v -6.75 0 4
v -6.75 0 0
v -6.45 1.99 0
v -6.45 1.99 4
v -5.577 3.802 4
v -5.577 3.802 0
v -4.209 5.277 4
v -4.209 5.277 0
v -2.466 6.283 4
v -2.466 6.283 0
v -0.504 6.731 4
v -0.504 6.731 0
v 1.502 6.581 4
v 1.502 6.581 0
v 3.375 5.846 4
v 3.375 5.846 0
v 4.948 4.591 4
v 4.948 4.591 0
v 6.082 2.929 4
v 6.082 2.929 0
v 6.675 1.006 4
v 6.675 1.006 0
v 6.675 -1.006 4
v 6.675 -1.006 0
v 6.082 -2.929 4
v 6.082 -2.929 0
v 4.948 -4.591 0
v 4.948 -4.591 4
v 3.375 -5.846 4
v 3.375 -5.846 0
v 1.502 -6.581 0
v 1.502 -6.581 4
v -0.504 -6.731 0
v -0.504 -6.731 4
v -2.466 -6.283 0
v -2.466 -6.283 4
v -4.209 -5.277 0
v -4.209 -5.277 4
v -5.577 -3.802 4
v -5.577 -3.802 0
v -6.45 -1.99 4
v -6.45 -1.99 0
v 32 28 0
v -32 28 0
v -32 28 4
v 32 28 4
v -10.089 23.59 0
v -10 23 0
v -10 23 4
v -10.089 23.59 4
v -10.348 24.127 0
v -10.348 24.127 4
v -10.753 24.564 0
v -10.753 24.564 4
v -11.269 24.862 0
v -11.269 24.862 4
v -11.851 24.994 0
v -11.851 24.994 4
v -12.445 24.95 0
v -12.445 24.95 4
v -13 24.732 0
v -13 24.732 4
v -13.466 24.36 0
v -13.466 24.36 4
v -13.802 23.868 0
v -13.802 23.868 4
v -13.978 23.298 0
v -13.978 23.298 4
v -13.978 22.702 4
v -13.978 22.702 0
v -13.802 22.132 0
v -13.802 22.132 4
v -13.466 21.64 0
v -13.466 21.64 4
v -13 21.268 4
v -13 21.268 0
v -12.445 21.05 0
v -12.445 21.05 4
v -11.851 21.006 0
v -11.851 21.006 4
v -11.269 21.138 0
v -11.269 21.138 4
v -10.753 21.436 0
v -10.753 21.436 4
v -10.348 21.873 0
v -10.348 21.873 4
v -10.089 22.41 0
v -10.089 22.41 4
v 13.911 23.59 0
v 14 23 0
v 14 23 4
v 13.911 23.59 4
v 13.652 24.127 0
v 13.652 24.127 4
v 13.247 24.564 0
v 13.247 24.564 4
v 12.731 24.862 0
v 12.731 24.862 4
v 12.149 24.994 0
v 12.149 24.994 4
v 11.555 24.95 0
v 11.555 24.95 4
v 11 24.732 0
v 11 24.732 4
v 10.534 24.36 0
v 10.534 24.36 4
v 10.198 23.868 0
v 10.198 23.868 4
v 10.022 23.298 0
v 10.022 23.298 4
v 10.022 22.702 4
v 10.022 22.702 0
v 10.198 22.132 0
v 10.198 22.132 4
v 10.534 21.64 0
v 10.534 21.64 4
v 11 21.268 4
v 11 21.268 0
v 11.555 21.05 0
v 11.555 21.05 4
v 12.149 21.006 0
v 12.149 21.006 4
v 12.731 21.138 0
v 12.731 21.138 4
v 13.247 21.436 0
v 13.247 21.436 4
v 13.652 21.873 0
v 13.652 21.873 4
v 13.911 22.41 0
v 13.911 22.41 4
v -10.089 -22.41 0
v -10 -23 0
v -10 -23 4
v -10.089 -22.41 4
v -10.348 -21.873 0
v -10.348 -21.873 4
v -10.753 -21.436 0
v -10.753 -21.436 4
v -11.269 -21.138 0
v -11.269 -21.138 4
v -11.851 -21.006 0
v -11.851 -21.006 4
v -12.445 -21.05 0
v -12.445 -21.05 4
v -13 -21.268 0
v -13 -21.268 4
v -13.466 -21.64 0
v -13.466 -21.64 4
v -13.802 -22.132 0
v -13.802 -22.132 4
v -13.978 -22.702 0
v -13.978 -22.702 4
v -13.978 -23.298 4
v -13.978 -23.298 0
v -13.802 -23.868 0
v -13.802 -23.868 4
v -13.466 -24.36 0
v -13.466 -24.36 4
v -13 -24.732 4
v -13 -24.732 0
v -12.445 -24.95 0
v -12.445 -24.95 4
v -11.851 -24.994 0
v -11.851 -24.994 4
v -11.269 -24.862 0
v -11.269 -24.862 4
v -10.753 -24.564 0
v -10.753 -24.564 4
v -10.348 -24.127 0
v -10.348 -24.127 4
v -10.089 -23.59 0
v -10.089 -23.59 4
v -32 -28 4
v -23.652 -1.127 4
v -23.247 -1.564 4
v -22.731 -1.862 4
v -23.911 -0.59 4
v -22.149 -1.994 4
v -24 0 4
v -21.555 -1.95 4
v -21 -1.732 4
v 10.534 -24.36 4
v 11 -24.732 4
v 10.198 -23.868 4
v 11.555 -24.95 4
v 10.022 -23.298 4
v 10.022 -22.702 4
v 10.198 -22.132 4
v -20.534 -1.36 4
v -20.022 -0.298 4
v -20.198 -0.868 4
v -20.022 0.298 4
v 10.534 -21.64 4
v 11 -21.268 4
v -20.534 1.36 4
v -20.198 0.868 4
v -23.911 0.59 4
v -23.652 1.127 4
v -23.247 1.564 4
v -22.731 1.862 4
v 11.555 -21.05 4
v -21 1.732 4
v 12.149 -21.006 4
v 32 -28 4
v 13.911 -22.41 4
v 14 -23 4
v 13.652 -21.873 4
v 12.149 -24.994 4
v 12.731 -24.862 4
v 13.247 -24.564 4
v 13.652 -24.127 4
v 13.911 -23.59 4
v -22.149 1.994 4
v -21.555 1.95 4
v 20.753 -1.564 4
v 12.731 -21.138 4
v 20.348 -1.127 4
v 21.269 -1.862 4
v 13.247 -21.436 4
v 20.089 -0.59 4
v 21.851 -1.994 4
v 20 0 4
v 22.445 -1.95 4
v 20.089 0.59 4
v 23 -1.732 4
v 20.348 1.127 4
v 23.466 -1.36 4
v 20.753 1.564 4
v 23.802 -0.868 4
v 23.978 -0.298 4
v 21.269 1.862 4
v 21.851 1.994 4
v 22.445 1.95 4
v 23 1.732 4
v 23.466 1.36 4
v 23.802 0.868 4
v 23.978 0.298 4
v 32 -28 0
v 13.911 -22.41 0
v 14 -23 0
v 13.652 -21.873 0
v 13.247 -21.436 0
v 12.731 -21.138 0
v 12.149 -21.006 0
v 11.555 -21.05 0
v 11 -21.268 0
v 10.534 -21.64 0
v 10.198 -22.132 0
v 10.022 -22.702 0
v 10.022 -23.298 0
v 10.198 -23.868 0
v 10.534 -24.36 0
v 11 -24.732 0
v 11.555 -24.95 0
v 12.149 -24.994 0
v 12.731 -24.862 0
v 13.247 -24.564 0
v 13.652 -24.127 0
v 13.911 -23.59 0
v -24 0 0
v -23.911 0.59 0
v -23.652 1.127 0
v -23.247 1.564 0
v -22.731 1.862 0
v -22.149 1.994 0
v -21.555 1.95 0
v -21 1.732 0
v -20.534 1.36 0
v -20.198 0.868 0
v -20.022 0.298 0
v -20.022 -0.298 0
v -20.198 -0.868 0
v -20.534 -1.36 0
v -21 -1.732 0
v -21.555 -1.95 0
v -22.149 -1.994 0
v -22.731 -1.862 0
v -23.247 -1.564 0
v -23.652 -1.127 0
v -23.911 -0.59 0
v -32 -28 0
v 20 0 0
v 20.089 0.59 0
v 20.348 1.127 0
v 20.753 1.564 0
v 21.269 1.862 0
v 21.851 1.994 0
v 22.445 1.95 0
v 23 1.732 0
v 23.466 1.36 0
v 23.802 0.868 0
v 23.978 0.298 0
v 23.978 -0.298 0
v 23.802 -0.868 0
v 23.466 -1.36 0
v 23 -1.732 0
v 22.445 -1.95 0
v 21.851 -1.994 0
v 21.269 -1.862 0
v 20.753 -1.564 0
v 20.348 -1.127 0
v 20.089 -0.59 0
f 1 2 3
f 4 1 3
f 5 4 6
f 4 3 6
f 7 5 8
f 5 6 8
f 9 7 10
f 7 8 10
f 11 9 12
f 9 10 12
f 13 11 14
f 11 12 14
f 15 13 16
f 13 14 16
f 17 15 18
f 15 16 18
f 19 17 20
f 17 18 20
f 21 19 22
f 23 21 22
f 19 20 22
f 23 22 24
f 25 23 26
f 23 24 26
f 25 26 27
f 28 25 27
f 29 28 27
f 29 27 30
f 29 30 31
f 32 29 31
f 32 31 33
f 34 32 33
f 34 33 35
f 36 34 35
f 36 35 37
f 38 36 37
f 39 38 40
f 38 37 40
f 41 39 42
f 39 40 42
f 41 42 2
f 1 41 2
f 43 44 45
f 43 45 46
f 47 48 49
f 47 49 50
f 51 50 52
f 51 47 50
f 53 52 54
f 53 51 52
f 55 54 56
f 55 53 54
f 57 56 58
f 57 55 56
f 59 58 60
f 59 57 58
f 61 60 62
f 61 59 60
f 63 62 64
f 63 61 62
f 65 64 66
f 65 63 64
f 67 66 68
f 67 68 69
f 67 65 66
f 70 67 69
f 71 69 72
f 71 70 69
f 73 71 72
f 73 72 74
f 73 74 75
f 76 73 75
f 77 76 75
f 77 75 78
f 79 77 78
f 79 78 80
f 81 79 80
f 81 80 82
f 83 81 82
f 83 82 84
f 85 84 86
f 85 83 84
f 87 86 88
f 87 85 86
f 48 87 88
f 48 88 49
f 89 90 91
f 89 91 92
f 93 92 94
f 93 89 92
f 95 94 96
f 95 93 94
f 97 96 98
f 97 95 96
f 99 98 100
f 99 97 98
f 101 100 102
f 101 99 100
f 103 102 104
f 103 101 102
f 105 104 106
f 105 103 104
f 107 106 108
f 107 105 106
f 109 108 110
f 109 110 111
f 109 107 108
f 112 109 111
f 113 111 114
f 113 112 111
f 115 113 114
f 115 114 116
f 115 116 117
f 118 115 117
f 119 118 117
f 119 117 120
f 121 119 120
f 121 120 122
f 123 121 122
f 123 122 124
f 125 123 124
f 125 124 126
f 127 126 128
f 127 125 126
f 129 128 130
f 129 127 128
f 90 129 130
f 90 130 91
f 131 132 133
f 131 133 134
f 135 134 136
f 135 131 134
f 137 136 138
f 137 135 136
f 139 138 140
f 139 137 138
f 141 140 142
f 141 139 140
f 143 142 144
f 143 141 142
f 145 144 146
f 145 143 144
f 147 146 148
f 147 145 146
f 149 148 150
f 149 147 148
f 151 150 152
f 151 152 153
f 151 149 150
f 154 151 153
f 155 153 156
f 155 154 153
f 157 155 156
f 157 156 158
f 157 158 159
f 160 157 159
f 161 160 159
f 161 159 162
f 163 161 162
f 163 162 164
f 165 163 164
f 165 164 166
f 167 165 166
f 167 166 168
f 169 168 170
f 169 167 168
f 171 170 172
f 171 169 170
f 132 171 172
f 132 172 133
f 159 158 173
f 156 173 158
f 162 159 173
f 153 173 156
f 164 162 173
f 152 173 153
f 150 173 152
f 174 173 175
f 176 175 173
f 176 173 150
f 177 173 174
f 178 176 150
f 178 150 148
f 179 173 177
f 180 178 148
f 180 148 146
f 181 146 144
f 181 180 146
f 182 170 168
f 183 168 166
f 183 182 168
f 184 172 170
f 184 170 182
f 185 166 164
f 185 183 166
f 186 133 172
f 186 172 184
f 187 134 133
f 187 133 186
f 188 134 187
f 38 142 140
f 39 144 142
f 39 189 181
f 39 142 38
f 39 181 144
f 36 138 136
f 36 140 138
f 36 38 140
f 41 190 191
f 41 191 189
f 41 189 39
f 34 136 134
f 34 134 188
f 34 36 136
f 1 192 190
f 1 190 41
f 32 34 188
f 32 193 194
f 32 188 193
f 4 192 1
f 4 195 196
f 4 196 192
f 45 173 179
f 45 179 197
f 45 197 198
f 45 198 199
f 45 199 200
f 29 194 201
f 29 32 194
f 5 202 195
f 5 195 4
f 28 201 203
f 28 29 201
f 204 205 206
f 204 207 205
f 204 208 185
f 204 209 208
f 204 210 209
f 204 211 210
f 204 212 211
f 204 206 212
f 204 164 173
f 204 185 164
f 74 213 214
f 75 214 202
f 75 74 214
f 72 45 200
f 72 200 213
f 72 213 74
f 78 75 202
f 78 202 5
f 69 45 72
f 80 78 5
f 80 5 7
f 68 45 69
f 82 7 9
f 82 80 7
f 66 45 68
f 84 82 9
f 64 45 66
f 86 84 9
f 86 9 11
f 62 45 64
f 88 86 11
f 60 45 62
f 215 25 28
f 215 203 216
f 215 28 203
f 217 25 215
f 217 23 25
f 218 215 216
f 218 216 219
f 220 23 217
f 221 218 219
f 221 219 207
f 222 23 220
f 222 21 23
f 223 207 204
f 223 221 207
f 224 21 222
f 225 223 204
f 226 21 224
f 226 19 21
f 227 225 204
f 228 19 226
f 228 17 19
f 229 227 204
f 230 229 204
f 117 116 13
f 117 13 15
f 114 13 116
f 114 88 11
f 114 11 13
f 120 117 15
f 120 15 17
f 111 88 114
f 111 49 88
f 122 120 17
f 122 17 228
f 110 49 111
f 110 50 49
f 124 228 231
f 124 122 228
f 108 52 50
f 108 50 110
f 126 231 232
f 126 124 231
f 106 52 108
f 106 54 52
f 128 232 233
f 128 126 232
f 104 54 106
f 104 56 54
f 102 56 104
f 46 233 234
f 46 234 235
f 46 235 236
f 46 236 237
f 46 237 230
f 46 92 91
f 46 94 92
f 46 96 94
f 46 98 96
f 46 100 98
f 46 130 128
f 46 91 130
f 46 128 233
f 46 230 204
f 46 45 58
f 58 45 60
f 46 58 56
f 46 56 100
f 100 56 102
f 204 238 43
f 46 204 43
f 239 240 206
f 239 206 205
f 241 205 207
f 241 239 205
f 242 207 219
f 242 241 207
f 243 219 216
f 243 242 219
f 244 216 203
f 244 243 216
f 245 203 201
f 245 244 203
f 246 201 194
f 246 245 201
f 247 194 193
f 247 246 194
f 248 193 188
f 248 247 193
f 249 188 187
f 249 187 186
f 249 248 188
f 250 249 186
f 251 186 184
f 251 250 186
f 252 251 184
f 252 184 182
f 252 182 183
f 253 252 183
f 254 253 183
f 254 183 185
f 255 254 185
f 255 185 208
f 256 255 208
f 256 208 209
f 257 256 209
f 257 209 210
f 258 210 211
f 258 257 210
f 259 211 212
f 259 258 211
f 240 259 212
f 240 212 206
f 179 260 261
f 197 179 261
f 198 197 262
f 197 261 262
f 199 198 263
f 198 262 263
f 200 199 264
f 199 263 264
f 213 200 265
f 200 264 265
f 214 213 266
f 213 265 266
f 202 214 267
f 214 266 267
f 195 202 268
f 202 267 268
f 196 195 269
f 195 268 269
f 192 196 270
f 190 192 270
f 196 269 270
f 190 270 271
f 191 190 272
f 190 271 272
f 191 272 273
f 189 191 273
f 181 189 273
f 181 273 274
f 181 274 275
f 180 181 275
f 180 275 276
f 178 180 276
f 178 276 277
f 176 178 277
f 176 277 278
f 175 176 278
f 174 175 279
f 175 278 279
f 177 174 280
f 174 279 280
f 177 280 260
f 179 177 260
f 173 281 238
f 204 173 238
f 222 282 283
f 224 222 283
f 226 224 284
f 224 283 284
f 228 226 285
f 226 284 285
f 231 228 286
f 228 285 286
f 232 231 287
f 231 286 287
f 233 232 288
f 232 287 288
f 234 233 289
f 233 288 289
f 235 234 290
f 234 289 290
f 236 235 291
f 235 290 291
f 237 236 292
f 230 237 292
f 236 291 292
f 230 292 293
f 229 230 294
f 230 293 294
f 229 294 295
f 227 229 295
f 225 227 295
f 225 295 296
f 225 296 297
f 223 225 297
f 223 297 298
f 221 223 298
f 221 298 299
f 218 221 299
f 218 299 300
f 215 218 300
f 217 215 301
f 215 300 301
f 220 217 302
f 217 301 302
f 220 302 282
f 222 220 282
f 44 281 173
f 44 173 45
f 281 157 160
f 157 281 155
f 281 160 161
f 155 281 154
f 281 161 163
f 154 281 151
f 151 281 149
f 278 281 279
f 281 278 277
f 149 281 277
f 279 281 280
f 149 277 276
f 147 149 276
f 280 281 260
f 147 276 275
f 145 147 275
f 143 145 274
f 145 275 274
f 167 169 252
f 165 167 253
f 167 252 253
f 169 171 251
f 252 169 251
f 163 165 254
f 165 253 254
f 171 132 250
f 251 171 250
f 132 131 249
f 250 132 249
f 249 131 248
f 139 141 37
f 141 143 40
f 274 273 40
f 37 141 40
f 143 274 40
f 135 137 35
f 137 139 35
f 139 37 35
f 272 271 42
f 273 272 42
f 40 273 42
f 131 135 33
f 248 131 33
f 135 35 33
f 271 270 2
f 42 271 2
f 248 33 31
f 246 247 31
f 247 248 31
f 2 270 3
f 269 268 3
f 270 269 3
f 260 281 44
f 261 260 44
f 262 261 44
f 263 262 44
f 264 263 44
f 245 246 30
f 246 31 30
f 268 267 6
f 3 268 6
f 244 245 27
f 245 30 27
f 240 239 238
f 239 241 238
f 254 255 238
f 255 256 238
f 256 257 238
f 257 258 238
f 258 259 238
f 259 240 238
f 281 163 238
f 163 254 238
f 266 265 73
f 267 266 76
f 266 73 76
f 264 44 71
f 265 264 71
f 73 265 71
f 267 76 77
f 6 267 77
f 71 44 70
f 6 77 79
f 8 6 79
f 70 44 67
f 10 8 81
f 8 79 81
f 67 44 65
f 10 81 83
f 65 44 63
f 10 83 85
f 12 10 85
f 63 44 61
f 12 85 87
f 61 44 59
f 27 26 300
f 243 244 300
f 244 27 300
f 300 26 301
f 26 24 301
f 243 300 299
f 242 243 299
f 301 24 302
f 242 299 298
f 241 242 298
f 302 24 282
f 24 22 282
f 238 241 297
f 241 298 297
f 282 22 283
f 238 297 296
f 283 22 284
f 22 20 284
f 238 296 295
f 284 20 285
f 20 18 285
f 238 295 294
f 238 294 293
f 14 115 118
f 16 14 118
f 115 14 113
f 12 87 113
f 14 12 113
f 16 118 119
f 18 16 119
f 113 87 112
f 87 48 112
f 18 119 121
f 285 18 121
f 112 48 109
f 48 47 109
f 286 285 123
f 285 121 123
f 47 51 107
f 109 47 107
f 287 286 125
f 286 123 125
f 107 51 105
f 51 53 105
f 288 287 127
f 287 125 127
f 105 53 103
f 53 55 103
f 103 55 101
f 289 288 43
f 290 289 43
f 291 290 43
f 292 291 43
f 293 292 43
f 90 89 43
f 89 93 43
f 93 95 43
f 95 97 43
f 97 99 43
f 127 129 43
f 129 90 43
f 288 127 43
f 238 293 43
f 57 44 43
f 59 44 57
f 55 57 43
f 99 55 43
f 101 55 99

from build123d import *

# Parameters (mm, degrees)
SKETCH1_W           = 64
SKETCH1_H           = 56
SKETCH1_R           = 2
BOSS_EXTRUDE1_DEPTH = 4
SKETCH2_R           = 6.75
CUT_EXTRUDE1_DEPTH  = 4
SKETCH3_R           = 2
CUT_EXTRUDE2_DEPTH  = 4


with BuildPart() as part:
    # Sketch1 → Boss-Extrude1 (new body)
    with BuildSketch(Plane.XY):
        Rectangle(SKETCH1_W, SKETCH1_H)
        with Locations((-12, 23)):
            Circle(SKETCH1_R, mode=Mode.SUBTRACT)
        with Locations((12, 23)):
            Circle(SKETCH1_R, mode=Mode.SUBTRACT)
        with Locations((-12, -23)):
            Circle(SKETCH1_R, mode=Mode.SUBTRACT)
        with Locations((12, -23)):
            Circle(SKETCH1_R, mode=Mode.SUBTRACT)
    extrude(amount=BOSS_EXTRUDE1_DEPTH)

    # Sketch2 → Cut-Extrude1 (cut)
    with BuildSketch(Plane(origin=(0, 0, 0), x_dir=(-1, 0, 0), z_dir=(0, 0, -1))):
        Circle(SKETCH2_R)
    extrude(amount=-CUT_EXTRUDE1_DEPTH, mode=Mode.SUBTRACT)

    # Sketch3 → Cut-Extrude2 (cut)
    with BuildSketch(Plane(origin=(0, 0, 0), x_dir=(-1, 0, 0), z_dir=(0, 0, -1))):
        with Locations((-22, 0)):
            Circle(SKETCH3_R)
        with Locations((22, 0)):
            Circle(SKETCH3_R)
    extrude(amount=-CUT_EXTRUDE2_DEPTH, mode=Mode.SUBTRACT)


solid = part.part
